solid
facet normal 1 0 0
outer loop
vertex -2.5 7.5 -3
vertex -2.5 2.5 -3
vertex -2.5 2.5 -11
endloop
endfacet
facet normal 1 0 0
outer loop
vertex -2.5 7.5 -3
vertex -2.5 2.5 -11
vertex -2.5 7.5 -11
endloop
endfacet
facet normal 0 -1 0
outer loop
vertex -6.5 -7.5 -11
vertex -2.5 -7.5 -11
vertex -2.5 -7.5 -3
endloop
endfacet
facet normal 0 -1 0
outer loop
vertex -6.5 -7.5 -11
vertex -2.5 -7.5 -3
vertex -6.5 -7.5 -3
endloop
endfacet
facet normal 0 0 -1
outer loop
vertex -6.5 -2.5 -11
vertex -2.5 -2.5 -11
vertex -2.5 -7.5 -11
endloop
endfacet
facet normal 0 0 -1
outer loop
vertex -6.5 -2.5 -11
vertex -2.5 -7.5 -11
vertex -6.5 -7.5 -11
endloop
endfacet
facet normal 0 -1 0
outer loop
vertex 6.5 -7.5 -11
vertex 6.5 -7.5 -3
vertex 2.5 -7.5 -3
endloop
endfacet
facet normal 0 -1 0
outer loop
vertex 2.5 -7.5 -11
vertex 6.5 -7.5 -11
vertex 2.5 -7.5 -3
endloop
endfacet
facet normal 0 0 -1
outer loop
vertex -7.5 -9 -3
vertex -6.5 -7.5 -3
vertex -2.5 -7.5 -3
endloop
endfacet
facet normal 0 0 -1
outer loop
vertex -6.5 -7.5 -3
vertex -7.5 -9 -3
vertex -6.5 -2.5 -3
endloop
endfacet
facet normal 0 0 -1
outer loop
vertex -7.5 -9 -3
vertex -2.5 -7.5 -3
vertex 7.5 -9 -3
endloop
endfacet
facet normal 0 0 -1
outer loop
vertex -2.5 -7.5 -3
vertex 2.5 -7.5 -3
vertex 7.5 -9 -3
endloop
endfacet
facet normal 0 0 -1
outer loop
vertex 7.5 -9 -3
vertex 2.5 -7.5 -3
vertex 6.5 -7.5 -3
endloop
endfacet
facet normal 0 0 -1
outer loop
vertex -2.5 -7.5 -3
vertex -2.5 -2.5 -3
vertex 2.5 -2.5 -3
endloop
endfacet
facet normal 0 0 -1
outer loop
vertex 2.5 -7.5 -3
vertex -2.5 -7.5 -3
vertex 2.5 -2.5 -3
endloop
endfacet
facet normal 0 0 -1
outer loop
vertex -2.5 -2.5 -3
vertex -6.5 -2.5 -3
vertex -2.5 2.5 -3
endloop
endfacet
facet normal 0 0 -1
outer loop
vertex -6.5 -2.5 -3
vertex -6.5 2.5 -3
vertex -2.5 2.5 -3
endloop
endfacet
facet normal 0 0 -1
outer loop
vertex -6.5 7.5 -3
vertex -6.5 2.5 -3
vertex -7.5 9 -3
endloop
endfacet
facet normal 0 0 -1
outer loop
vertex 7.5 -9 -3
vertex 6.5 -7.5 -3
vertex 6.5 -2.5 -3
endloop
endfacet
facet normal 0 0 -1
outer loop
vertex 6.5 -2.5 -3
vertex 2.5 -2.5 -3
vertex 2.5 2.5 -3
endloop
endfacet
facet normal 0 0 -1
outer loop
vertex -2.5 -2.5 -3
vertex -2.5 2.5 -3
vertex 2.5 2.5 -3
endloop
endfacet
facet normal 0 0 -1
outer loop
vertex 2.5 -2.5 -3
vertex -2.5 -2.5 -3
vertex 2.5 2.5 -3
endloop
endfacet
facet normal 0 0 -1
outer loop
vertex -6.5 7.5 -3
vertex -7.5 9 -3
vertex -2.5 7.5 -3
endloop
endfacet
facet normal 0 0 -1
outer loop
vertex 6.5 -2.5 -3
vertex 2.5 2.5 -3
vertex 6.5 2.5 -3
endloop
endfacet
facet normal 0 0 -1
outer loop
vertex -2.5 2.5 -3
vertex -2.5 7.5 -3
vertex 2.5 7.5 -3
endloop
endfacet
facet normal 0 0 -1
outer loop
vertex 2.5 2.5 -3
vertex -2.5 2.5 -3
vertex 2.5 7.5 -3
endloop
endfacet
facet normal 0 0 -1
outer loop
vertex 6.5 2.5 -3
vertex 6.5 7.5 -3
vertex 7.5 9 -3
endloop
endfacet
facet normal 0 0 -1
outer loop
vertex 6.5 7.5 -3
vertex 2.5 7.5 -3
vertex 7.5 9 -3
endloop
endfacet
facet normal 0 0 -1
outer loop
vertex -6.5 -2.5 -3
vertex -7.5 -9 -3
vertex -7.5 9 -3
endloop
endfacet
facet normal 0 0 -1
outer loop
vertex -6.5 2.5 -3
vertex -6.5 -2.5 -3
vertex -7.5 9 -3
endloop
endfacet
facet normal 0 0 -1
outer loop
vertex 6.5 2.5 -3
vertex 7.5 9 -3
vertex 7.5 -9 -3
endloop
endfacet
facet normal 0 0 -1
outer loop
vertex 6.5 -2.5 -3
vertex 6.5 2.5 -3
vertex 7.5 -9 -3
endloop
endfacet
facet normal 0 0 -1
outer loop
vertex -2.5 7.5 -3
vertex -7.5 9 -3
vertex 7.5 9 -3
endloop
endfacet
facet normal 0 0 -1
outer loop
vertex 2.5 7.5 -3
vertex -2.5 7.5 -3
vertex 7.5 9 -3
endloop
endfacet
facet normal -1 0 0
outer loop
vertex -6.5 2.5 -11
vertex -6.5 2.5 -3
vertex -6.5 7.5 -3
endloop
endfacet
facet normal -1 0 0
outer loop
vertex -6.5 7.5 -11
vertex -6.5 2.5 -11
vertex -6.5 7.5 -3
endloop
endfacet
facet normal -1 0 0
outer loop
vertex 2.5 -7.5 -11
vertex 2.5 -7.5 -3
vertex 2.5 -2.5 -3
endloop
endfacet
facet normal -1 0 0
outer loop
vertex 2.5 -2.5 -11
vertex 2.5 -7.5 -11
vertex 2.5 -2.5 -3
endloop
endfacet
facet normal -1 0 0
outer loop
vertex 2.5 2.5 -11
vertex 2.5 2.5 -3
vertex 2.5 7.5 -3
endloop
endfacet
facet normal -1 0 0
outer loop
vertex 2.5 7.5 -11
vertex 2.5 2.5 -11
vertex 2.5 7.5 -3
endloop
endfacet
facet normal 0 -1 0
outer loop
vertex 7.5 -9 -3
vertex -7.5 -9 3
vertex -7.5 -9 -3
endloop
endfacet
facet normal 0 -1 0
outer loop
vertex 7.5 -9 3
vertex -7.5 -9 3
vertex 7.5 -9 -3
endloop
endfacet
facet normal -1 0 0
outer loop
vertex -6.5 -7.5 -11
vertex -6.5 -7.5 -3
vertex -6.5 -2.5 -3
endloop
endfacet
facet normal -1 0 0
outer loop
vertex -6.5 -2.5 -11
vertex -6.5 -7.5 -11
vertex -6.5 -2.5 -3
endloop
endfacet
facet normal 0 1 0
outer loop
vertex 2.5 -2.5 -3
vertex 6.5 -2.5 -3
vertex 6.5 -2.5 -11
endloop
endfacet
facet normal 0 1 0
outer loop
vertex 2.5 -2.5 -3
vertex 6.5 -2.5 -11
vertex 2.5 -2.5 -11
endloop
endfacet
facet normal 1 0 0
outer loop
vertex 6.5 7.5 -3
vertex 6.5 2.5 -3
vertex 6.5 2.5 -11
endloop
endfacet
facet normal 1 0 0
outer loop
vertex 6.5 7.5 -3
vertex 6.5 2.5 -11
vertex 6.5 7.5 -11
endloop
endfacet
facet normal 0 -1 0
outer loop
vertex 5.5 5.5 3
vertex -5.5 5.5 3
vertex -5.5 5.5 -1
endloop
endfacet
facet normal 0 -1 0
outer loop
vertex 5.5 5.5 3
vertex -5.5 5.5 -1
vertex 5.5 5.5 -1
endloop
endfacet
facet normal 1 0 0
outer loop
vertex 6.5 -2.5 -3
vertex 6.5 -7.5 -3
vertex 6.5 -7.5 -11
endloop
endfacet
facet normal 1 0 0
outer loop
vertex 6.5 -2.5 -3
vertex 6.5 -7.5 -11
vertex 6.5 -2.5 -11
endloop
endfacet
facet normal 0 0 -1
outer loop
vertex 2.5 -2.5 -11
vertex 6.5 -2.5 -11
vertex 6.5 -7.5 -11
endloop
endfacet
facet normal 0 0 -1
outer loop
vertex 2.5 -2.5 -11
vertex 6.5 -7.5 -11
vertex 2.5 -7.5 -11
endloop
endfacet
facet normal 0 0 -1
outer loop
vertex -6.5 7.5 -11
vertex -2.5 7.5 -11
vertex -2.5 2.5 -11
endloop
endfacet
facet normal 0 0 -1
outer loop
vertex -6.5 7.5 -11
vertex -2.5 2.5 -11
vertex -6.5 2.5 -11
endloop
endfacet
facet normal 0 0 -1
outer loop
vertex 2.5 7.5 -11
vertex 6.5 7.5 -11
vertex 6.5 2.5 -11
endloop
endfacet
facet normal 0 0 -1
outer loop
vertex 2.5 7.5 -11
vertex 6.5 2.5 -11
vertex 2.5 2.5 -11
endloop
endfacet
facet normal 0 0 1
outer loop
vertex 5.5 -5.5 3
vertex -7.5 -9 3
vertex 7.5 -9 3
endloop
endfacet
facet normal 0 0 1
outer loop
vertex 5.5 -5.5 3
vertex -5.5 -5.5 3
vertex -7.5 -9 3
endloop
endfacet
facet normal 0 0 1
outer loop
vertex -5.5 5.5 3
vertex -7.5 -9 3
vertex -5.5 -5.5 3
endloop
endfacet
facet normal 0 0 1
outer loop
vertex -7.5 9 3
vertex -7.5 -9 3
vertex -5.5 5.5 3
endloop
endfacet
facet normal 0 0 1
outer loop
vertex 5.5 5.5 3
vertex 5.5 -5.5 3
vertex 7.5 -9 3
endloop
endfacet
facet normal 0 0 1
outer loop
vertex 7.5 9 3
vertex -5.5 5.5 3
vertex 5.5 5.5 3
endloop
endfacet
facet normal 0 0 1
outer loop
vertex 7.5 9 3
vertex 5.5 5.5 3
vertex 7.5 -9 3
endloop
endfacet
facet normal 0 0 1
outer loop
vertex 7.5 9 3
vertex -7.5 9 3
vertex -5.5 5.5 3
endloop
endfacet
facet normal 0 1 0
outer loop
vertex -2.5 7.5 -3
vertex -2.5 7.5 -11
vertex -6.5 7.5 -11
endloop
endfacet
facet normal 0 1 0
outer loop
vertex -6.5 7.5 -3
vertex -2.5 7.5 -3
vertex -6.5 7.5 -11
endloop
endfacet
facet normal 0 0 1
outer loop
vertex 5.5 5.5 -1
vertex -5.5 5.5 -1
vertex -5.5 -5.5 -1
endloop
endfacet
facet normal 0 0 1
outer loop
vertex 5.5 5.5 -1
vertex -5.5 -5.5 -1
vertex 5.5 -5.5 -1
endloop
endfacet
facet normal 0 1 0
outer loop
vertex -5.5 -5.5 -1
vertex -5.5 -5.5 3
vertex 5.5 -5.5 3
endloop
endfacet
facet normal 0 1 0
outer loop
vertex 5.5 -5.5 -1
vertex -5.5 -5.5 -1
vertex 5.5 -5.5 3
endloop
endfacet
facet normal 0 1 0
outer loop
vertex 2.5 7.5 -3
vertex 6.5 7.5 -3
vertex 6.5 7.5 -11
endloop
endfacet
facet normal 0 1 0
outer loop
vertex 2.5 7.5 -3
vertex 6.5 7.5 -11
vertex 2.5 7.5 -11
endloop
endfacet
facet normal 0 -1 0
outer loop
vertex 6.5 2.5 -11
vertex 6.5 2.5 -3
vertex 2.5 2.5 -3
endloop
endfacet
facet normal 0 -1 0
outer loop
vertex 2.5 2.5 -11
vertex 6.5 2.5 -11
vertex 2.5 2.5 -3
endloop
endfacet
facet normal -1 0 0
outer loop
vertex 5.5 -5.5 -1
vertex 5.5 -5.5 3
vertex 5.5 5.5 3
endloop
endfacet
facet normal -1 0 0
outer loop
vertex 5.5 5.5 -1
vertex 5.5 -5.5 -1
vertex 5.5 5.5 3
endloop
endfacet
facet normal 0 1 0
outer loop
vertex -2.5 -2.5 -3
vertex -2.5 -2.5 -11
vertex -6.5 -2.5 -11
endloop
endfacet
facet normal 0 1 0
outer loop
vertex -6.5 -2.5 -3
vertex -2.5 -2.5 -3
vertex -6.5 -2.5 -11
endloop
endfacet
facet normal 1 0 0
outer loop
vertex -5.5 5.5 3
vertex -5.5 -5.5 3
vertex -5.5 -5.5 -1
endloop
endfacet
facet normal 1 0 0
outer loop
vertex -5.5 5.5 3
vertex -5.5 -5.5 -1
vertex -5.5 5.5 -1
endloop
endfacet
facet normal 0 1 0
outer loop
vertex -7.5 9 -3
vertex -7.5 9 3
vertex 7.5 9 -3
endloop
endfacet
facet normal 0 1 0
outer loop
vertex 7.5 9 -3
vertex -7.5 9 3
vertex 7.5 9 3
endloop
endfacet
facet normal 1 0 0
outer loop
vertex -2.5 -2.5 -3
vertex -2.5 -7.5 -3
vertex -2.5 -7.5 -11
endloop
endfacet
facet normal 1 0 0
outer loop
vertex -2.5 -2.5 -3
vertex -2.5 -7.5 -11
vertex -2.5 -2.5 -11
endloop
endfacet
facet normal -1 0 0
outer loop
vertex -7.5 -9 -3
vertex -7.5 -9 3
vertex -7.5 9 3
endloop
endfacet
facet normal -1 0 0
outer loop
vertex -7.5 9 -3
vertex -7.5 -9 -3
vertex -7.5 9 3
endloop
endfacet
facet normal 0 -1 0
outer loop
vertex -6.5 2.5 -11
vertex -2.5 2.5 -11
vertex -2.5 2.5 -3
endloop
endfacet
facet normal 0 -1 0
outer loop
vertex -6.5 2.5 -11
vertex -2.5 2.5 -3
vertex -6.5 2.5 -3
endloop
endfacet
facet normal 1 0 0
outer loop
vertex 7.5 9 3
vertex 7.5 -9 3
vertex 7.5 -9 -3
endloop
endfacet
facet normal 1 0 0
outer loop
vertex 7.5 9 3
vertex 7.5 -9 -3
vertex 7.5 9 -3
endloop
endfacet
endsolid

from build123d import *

# Parameters (mm, degrees)
SKETCH1_W           = 15
SKETCH1_H           = 18
BOSS_EXTRUDE1_DEPTH = 3
SKETCH2_W           = 11
SKETCH2_H           = 11
CUT_EXTRUDE1_DEPTH  = 4
SKETCH4_W           = 4
SKETCH4_H           = 5
BOSS_EXTRUDE2_DEPTH = 8


with BuildPart() as part:
    # Sketch1 → Boss-Extrude1 (new, symmetric)
    with BuildSketch(Plane.XY):
        Rectangle(SKETCH1_W, SKETCH1_H)
    extrude(amount=BOSS_EXTRUDE1_DEPTH, both=True)

    # Sketch2 → Cut-Extrude1 (cut)
    with BuildSketch(Plane.XY.offset(3)):
        Rectangle(SKETCH2_W, SKETCH2_H)
    extrude(amount=-CUT_EXTRUDE1_DEPTH, mode=Mode.SUBTRACT)

    # Sketch4 → Boss-Extrude2 (add)
    with BuildSketch(Plane(origin=(0, 0, -3), x_dir=(-1, 0, 0), z_dir=(0, 0, -1))):
        with Locations((-4.5, 5)):
            Rectangle(SKETCH4_W, SKETCH4_H)
        with Locations((4.5, 5)):
            Rectangle(SKETCH4_W, SKETCH4_H)
        with Locations((4.5, -5)):
            Rectangle(SKETCH4_W, SKETCH4_H)
        with Locations((-4.5, -5)):
            Rectangle(SKETCH4_W, SKETCH4_H)
    extrude(amount=BOSS_EXTRUDE2_DEPTH)


solid = part.part
